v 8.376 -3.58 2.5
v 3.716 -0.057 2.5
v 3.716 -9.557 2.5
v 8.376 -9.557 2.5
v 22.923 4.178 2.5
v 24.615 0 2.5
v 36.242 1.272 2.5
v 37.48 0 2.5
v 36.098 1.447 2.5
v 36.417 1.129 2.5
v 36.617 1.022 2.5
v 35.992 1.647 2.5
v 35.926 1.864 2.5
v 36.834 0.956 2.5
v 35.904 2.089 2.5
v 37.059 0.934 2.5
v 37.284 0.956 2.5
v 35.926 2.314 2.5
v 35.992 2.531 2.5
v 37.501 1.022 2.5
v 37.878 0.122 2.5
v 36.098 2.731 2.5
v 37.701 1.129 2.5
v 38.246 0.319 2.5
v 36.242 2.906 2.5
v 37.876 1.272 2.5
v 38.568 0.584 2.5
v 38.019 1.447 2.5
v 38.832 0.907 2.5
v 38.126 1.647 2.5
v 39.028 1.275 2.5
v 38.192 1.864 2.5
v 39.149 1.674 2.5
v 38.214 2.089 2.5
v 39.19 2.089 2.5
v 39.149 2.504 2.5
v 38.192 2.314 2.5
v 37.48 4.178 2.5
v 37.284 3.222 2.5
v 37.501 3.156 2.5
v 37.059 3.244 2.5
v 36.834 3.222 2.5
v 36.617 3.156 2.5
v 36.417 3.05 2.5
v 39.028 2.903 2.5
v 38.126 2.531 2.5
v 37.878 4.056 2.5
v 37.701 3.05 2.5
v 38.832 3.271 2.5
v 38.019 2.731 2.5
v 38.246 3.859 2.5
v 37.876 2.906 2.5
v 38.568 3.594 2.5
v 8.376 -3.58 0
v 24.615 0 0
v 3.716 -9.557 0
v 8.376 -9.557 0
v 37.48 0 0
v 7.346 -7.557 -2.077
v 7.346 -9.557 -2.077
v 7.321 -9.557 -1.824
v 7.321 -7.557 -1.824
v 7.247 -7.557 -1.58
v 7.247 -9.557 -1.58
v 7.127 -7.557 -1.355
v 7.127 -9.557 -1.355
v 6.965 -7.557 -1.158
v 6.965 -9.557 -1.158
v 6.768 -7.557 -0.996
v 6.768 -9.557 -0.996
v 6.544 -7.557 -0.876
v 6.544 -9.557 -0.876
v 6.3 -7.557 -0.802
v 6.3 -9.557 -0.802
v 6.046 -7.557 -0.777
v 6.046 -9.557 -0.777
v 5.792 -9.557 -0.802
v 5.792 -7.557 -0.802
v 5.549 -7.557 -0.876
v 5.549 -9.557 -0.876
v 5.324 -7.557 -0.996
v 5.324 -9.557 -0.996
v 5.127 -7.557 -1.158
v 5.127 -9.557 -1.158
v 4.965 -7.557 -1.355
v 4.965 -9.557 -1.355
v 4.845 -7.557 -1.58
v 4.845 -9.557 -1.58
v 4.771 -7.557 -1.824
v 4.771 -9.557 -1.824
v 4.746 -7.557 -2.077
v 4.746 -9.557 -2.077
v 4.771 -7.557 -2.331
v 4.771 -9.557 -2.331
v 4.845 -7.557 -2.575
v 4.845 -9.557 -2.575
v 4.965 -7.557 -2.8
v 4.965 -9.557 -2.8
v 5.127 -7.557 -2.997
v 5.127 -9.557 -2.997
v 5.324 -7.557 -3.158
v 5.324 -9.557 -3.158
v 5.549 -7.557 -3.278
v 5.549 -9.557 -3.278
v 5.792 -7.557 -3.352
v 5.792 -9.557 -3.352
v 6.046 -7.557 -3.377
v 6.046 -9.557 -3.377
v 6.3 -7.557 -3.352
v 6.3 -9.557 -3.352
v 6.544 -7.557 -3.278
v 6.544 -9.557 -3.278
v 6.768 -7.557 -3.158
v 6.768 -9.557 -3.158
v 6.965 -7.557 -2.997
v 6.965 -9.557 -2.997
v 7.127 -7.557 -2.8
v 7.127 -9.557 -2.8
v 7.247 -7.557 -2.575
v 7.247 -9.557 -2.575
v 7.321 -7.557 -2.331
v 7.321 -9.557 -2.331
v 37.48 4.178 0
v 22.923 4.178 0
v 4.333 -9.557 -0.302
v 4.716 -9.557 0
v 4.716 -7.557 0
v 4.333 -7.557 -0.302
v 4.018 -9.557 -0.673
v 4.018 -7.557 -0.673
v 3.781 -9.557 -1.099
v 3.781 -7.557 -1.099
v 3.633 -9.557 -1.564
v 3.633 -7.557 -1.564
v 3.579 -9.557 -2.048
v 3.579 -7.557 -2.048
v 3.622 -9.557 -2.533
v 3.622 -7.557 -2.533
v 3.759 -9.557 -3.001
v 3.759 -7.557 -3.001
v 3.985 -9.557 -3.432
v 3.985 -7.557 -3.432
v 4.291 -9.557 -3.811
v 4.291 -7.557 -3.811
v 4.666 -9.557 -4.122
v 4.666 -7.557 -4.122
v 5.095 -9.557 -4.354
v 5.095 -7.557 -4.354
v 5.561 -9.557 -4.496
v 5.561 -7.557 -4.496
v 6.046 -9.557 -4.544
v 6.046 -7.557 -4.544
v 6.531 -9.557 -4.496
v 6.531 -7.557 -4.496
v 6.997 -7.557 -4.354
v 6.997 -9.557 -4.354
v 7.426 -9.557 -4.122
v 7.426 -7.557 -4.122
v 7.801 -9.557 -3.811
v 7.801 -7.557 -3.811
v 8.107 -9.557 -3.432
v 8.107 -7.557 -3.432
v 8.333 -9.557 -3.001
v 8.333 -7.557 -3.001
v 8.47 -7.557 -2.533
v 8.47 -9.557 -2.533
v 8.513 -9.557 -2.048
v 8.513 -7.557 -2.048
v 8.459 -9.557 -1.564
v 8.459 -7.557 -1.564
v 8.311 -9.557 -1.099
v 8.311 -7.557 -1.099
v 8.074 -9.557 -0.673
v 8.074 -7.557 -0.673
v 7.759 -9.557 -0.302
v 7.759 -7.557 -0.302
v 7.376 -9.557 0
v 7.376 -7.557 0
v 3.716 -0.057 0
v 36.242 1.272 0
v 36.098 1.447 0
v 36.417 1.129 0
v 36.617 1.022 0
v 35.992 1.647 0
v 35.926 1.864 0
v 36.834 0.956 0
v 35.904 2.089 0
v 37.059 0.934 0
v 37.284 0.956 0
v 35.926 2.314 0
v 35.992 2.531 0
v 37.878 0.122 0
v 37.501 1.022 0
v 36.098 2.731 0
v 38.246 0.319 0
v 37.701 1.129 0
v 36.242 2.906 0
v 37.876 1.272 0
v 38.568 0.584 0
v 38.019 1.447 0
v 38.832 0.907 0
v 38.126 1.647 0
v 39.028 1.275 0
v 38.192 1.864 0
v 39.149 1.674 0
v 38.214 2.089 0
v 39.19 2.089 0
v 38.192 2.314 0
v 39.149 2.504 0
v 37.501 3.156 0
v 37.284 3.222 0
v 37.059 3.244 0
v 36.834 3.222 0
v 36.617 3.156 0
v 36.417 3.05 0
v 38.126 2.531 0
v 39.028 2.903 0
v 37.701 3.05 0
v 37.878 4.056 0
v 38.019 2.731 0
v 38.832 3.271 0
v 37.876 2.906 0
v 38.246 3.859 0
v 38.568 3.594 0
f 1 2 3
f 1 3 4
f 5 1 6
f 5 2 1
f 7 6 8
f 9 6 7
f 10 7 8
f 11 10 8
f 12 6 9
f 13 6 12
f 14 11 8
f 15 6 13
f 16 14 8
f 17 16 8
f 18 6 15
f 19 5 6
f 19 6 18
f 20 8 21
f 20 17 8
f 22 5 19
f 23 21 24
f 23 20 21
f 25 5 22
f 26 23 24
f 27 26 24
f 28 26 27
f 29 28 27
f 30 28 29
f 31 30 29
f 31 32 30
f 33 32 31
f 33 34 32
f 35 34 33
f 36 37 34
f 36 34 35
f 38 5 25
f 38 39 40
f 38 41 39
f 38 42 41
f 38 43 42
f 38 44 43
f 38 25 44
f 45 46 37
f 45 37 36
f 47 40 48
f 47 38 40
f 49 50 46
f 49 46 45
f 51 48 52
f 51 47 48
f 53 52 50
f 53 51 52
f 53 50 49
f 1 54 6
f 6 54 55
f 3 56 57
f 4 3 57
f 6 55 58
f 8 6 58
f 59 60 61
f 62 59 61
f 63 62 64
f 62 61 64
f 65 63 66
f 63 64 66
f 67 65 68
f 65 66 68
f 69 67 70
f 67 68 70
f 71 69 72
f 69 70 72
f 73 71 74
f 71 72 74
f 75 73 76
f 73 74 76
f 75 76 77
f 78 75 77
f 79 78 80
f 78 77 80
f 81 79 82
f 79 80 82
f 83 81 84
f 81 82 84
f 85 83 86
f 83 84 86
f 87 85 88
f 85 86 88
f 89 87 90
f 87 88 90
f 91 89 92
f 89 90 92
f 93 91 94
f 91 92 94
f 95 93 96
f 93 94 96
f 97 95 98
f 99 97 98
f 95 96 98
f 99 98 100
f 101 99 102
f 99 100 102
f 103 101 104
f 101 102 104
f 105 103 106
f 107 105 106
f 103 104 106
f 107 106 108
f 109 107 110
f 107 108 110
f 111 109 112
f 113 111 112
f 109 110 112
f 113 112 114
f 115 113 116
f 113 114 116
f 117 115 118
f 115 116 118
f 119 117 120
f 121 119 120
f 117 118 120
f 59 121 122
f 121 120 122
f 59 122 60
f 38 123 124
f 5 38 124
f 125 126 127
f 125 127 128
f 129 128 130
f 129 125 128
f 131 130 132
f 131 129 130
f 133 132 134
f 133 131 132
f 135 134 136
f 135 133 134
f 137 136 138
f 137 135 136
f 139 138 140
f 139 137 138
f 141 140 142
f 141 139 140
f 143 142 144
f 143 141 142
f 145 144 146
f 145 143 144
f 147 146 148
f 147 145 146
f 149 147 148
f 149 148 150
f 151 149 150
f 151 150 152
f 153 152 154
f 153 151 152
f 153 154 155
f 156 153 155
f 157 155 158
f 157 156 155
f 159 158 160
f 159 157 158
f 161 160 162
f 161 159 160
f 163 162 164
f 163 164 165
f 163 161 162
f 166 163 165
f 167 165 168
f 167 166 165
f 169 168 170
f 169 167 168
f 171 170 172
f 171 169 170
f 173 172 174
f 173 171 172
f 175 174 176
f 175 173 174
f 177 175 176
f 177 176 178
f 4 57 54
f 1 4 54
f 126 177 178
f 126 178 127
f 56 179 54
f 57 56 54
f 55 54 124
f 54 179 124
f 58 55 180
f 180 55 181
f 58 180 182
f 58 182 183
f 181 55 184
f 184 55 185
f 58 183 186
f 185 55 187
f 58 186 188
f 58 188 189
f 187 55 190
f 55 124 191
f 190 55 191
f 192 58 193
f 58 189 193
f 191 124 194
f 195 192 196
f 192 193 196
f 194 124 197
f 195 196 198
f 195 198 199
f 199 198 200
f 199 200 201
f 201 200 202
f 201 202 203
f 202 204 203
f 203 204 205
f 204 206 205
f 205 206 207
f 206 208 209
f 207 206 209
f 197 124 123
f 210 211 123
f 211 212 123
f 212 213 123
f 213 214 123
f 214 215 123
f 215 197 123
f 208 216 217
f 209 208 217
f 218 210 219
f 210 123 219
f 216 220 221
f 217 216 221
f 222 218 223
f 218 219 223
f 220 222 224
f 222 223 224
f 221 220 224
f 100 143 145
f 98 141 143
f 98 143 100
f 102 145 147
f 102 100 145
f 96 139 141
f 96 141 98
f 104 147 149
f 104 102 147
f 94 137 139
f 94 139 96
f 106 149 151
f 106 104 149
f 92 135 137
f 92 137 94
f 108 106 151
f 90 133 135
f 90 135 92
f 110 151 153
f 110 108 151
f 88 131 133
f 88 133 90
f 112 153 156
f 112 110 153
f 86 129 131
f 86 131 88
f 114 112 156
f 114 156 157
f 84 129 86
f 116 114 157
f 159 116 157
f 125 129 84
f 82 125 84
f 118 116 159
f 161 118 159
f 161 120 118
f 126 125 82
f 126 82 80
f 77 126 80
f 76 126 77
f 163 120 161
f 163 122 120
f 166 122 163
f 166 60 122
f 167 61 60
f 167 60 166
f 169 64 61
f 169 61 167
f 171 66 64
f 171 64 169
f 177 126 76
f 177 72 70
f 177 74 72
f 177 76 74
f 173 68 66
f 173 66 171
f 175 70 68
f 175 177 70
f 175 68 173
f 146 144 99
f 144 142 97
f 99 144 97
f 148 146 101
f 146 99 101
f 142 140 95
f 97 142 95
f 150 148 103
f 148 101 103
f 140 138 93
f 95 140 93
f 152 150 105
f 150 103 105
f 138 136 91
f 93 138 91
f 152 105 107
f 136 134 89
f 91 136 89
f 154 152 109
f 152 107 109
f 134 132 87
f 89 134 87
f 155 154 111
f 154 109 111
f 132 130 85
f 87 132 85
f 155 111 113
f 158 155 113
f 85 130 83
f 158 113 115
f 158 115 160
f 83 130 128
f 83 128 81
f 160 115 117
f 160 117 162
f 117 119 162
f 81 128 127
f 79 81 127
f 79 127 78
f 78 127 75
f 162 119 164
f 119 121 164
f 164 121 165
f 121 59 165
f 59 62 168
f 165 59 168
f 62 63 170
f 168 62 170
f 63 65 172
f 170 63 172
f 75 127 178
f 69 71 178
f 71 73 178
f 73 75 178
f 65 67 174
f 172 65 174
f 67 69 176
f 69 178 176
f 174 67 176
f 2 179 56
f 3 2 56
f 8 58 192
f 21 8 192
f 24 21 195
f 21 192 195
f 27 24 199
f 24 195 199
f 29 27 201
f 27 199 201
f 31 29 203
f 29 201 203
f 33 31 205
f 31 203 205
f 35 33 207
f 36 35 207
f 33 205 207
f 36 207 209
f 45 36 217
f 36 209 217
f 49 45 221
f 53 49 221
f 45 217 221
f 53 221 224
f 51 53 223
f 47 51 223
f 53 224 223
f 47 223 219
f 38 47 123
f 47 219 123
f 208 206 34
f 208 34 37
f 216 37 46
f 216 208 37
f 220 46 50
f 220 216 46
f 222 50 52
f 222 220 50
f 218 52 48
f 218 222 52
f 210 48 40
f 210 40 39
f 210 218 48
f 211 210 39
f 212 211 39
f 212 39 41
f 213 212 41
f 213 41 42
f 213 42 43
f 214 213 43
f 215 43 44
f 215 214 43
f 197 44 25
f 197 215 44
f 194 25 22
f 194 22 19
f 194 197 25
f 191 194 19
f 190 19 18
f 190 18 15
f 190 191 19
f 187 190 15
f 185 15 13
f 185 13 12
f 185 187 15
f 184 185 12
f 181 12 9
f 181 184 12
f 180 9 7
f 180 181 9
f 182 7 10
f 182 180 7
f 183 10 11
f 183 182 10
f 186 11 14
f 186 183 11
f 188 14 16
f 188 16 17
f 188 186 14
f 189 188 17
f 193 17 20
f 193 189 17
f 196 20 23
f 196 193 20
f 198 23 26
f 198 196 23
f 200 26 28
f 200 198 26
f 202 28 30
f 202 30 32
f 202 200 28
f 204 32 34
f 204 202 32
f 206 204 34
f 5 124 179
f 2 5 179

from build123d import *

# Parameters (mm, degrees)
SKETCH1_R           = 1.155127989
BOSS_EXTRUDE1_DEPTH = 2.5
SKETCH4_R           = 1.3
BOSS_EXTRUDE5_DEPTH = 2


with BuildPart() as part:
    # Sketch1 → Boss-Extrude1 (new body)
    with BuildSketch(Plane.XY):
        with BuildLine():
            Line((24.615399121, 0), (37.479574188, 0))
            ThreePointArc((37.479574188, 0), (39.18992359, 2.089117865), (37.479574188, 4.178235731))
            Line((37.479574188, 4.178235731), (22.923117505, 4.178235731))
            Line((22.923117505, 4.178235731), (3.715813686, -0.056552658))
            Line((3.715813686, -0.056552658), (3.715813686, -9.556552658))
            Line((3.715813686, -9.556552658), (8.3762383, -9.556552658))
            Line((8.3762383, -9.556552658), (8.3762383, -3.580378086))
            Line((8.3762383, -3.580378086), (24.615399121, 0))
        make_face()
        with Locations((37.058865303, 2.089117865)):
            Circle(SKETCH1_R, mode=Mode.SUBTRACT)
    extrude(amount=BOSS_EXTRUDE1_DEPTH)


with BuildPart() as body_2:
    # Sketch4 → Boss-Extrude5 (new body)
    with BuildSketch(Plane.XZ.offset(9.556552658)):
        with BuildLine():
            Line((7.3762383, 0), (4.715813686, 0))
            ThreePointArc((4.715813686, 0), (6.046025993, -4.544205624), (7.3762383, 0))
        make_face()
        with Locations((6.046025993, -2.077408191)):
            Circle(SKETCH4_R, mode=Mode.SUBTRACT)
    extrude(amount=-BOSS_EXTRUDE5_DEPTH)


solid = Compound([part.part, body_2.part])
